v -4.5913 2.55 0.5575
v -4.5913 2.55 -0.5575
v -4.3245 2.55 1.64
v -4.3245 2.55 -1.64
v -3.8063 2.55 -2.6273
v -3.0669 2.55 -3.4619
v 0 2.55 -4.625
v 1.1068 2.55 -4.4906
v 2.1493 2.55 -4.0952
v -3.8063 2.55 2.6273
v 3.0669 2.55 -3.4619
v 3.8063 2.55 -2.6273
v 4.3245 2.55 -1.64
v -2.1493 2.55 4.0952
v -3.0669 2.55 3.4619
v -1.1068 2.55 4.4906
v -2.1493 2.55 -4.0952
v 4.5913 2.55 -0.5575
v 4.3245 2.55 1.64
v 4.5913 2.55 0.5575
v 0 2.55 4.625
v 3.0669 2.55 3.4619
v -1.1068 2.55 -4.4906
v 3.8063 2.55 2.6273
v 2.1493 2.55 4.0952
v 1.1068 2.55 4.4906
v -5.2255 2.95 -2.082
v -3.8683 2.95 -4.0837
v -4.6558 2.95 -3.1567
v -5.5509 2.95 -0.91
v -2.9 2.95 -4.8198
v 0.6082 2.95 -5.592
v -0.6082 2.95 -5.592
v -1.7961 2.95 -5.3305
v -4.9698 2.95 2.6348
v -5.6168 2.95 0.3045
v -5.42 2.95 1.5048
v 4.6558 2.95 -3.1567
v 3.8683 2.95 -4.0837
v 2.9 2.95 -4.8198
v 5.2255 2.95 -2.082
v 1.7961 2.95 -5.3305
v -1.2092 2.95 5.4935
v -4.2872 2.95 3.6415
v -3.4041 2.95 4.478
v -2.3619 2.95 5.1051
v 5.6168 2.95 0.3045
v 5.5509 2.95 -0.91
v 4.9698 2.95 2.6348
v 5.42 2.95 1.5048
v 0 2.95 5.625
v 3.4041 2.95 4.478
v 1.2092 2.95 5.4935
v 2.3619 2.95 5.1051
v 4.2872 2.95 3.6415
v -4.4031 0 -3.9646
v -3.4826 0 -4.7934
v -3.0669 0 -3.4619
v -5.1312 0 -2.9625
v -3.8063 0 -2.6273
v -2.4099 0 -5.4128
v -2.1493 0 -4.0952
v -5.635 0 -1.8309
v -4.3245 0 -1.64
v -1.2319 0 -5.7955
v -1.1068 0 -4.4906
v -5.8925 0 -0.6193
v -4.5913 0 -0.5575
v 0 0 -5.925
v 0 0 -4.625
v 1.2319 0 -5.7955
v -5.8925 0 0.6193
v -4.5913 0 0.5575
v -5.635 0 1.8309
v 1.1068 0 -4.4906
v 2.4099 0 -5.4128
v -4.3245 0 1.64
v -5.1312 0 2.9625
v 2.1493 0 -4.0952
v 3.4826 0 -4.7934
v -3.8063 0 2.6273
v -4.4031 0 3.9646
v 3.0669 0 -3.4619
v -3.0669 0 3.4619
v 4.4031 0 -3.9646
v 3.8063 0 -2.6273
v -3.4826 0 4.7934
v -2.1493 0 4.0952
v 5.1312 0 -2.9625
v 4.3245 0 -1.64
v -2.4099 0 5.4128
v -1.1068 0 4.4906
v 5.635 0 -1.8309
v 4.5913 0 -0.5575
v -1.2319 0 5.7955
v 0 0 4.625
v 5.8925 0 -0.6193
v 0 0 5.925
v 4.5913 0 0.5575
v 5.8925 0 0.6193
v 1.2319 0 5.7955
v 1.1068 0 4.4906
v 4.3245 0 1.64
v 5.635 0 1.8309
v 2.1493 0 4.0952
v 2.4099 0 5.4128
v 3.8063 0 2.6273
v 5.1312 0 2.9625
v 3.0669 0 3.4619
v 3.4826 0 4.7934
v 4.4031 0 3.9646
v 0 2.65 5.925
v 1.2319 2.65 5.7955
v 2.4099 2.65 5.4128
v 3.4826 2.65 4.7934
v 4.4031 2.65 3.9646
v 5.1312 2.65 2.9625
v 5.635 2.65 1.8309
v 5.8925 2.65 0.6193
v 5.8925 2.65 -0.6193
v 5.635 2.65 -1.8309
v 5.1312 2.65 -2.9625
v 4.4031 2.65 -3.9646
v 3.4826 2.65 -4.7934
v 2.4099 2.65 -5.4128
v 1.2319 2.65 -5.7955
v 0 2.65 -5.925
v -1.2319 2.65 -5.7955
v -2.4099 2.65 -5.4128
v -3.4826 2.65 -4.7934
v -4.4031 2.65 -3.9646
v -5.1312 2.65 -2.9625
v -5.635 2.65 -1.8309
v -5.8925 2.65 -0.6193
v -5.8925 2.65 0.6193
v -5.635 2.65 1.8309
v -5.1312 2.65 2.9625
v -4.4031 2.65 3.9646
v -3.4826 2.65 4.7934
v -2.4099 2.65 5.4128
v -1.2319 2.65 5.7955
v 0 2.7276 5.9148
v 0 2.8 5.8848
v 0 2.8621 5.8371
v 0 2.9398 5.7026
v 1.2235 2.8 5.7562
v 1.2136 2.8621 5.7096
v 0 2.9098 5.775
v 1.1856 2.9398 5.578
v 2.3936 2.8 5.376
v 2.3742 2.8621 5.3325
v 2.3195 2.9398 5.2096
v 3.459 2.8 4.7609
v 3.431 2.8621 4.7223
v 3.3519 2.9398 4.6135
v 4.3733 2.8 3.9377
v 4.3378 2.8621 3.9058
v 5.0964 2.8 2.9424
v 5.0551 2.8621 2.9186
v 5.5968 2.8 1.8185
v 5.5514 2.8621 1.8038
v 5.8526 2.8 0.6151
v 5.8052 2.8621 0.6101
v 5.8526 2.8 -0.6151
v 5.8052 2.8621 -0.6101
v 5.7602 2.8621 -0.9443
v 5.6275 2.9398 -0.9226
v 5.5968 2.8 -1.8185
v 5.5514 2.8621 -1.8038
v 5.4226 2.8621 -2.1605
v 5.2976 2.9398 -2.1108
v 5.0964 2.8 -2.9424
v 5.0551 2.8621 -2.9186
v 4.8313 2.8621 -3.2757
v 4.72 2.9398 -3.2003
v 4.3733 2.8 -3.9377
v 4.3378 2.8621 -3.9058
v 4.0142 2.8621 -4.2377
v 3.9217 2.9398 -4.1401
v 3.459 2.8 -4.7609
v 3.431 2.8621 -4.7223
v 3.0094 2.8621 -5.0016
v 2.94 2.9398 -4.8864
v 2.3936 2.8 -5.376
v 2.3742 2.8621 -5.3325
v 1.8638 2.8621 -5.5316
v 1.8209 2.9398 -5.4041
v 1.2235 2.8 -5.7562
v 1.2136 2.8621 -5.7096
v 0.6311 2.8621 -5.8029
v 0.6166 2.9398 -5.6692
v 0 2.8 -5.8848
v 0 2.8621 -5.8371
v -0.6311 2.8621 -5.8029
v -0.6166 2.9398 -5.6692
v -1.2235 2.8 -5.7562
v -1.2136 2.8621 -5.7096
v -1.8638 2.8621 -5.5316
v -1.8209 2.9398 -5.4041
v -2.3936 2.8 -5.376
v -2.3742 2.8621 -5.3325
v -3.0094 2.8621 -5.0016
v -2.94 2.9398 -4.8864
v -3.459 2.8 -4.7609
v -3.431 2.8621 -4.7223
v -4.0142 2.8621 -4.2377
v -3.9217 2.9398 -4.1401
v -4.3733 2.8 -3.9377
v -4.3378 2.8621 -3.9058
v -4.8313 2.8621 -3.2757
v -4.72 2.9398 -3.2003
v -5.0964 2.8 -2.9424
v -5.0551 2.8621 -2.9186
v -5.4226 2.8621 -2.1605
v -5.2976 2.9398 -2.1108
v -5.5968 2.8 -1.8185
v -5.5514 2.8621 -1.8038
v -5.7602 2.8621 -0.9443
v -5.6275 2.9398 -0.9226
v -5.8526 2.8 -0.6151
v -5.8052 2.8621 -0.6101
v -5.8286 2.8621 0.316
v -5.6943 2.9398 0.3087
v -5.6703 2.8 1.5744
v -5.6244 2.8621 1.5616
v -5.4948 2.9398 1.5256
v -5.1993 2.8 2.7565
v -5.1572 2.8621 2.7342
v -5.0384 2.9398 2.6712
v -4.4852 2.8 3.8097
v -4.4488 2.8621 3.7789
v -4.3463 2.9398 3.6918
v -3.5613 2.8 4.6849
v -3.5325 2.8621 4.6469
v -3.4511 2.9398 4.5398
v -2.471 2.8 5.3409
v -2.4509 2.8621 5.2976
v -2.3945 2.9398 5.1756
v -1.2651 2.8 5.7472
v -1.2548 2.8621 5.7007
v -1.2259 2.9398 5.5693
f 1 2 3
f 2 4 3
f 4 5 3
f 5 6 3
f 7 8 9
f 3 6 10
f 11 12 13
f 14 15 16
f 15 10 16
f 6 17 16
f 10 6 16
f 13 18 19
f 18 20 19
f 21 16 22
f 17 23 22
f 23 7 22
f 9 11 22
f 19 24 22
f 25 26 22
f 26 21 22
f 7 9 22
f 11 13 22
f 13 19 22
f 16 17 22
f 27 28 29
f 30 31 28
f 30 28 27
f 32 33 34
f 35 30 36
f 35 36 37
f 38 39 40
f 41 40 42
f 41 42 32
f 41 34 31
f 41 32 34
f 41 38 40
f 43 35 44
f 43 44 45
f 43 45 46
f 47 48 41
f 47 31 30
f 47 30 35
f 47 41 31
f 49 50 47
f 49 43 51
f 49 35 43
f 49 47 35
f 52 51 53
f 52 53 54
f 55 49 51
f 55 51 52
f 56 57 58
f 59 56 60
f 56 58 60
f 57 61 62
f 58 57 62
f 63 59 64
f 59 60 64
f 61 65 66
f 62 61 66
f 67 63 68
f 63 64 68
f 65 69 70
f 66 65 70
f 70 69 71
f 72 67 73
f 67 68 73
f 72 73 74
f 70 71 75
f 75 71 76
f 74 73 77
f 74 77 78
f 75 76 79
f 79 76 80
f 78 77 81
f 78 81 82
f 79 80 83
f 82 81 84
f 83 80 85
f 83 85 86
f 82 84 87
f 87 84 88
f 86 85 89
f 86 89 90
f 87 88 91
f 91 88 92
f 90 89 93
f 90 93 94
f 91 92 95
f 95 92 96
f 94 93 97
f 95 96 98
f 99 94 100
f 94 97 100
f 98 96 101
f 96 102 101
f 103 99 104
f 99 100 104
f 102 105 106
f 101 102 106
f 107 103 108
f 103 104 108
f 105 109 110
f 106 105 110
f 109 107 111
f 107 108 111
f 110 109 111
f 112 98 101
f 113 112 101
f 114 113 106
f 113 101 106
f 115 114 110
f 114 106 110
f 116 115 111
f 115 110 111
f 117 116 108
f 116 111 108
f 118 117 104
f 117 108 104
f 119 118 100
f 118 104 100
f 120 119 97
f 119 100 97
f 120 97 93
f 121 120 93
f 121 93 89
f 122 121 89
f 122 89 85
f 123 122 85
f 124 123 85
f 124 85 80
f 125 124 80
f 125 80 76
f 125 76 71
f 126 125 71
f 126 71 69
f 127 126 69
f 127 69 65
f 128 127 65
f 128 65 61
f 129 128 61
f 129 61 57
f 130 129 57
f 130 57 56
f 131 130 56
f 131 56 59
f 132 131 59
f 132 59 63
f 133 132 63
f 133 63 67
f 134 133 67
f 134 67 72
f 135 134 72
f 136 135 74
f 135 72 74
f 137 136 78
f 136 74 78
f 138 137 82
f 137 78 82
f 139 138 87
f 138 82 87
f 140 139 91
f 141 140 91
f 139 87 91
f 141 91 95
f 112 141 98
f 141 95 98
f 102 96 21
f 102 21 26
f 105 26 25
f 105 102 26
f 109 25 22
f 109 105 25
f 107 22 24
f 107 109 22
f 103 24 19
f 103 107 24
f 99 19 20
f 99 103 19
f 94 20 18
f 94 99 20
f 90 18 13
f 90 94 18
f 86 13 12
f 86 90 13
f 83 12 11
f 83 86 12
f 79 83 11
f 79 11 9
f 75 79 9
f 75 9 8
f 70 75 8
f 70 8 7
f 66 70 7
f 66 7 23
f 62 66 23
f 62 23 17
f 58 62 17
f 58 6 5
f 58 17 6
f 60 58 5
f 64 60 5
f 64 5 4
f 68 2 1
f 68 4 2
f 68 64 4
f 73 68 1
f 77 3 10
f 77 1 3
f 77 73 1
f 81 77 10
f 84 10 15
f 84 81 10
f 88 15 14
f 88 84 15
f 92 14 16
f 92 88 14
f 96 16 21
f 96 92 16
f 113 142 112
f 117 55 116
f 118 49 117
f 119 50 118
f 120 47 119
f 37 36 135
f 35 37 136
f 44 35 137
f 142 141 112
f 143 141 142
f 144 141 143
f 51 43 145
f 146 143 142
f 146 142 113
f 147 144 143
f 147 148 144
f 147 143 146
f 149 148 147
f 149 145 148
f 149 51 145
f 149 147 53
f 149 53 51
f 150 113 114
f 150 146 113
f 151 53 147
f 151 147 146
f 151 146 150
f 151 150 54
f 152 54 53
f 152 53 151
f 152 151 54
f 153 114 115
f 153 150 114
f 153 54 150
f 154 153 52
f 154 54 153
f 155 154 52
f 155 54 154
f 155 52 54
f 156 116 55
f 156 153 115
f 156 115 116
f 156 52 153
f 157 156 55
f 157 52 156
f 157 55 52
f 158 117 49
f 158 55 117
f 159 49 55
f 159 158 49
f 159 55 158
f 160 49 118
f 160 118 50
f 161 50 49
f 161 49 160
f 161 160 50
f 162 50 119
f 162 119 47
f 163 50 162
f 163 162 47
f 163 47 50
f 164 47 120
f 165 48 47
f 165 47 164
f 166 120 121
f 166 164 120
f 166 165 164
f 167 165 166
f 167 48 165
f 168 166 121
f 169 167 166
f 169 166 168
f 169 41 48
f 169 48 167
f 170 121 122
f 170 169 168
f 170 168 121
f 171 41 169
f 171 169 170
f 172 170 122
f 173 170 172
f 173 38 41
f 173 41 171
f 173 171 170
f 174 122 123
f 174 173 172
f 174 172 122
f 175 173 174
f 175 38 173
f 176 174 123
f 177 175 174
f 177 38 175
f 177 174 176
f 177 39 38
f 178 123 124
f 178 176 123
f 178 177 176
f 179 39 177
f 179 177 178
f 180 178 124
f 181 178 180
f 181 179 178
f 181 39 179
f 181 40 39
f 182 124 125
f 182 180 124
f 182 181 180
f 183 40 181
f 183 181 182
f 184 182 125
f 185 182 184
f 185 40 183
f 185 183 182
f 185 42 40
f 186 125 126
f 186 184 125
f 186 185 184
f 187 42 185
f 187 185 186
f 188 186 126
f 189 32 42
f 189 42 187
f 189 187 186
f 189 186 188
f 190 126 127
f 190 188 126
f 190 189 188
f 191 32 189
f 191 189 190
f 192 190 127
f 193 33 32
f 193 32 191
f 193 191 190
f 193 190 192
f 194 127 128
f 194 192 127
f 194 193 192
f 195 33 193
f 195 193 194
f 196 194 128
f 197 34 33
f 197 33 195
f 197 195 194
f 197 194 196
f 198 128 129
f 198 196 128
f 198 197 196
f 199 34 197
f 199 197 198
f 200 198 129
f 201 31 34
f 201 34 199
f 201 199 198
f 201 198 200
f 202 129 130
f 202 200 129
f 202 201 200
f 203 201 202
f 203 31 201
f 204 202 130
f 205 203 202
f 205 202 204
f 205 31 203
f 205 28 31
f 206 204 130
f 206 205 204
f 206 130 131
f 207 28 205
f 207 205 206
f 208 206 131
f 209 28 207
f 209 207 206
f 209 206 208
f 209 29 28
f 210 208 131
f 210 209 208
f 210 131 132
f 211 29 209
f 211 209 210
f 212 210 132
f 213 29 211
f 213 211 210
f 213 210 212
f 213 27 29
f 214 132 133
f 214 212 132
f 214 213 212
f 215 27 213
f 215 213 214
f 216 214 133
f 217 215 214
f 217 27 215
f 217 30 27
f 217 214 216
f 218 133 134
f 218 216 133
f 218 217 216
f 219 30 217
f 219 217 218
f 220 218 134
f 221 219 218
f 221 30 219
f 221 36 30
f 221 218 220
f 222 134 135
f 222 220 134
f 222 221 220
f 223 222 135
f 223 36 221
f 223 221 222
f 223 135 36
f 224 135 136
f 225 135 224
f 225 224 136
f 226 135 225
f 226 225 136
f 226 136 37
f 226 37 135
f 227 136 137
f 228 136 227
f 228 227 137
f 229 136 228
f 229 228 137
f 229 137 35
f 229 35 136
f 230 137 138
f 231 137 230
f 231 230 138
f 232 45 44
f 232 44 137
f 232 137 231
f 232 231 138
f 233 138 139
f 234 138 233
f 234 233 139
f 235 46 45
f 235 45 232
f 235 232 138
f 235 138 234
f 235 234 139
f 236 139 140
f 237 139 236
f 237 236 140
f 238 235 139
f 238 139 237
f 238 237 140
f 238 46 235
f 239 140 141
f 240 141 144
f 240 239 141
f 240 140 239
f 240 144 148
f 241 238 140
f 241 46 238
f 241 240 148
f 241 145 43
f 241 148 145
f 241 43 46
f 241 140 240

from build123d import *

# Parameters (mm, degrees)
SKETCH1_R           = 5.925
SKETCH1_R_2         = 4.625
BOSS_EXTRUDE1_DEPTH = 2.95
BOSS_EXTRUDE2_START = -0.4
SKETCH2_R           = 5.925
BOSS_EXTRUDE2_DEPTH = 0.4
FILLET1_R           = 0.3


with BuildPart() as part:
    # Sketch1 → Boss-Extrude1 (new body)
    with BuildSketch(Plane(origin=(0, 0, 0), x_dir=(1, 0, 0), z_dir=(0, 1, 0))):
        with Locations(Location((0, 0, 0), (0, 0, 270))):
            Circle(SKETCH1_R)
        with Locations(Location((0, 0, 0), (0, 0, 270))):
            Circle(SKETCH1_R_2, mode=Mode.SUBTRACT)
    extrude(amount=BOSS_EXTRUDE1_DEPTH)

    # Sketch2 → Boss-Extrude2 (add)
    with BuildSketch(Plane(origin=(0, 2.95, 0), x_dir=(1, 0, 0), z_dir=(0, 1, 0)).offset(BOSS_EXTRUDE2_START)):
        with Locations(Location((0, 0, 0), (0, 0, 270))):
            Circle(SKETCH2_R)
    extrude(amount=BOSS_EXTRUDE2_DEPTH)

    # Fillet1
    fillet1_edges = [part.edges().sort_by_distance(p)[0] for p in [
        (0, 2.95, -5.925),
    ]]
    fillet(fillet1_edges, radius=FILLET1_R)


solid = part.part
